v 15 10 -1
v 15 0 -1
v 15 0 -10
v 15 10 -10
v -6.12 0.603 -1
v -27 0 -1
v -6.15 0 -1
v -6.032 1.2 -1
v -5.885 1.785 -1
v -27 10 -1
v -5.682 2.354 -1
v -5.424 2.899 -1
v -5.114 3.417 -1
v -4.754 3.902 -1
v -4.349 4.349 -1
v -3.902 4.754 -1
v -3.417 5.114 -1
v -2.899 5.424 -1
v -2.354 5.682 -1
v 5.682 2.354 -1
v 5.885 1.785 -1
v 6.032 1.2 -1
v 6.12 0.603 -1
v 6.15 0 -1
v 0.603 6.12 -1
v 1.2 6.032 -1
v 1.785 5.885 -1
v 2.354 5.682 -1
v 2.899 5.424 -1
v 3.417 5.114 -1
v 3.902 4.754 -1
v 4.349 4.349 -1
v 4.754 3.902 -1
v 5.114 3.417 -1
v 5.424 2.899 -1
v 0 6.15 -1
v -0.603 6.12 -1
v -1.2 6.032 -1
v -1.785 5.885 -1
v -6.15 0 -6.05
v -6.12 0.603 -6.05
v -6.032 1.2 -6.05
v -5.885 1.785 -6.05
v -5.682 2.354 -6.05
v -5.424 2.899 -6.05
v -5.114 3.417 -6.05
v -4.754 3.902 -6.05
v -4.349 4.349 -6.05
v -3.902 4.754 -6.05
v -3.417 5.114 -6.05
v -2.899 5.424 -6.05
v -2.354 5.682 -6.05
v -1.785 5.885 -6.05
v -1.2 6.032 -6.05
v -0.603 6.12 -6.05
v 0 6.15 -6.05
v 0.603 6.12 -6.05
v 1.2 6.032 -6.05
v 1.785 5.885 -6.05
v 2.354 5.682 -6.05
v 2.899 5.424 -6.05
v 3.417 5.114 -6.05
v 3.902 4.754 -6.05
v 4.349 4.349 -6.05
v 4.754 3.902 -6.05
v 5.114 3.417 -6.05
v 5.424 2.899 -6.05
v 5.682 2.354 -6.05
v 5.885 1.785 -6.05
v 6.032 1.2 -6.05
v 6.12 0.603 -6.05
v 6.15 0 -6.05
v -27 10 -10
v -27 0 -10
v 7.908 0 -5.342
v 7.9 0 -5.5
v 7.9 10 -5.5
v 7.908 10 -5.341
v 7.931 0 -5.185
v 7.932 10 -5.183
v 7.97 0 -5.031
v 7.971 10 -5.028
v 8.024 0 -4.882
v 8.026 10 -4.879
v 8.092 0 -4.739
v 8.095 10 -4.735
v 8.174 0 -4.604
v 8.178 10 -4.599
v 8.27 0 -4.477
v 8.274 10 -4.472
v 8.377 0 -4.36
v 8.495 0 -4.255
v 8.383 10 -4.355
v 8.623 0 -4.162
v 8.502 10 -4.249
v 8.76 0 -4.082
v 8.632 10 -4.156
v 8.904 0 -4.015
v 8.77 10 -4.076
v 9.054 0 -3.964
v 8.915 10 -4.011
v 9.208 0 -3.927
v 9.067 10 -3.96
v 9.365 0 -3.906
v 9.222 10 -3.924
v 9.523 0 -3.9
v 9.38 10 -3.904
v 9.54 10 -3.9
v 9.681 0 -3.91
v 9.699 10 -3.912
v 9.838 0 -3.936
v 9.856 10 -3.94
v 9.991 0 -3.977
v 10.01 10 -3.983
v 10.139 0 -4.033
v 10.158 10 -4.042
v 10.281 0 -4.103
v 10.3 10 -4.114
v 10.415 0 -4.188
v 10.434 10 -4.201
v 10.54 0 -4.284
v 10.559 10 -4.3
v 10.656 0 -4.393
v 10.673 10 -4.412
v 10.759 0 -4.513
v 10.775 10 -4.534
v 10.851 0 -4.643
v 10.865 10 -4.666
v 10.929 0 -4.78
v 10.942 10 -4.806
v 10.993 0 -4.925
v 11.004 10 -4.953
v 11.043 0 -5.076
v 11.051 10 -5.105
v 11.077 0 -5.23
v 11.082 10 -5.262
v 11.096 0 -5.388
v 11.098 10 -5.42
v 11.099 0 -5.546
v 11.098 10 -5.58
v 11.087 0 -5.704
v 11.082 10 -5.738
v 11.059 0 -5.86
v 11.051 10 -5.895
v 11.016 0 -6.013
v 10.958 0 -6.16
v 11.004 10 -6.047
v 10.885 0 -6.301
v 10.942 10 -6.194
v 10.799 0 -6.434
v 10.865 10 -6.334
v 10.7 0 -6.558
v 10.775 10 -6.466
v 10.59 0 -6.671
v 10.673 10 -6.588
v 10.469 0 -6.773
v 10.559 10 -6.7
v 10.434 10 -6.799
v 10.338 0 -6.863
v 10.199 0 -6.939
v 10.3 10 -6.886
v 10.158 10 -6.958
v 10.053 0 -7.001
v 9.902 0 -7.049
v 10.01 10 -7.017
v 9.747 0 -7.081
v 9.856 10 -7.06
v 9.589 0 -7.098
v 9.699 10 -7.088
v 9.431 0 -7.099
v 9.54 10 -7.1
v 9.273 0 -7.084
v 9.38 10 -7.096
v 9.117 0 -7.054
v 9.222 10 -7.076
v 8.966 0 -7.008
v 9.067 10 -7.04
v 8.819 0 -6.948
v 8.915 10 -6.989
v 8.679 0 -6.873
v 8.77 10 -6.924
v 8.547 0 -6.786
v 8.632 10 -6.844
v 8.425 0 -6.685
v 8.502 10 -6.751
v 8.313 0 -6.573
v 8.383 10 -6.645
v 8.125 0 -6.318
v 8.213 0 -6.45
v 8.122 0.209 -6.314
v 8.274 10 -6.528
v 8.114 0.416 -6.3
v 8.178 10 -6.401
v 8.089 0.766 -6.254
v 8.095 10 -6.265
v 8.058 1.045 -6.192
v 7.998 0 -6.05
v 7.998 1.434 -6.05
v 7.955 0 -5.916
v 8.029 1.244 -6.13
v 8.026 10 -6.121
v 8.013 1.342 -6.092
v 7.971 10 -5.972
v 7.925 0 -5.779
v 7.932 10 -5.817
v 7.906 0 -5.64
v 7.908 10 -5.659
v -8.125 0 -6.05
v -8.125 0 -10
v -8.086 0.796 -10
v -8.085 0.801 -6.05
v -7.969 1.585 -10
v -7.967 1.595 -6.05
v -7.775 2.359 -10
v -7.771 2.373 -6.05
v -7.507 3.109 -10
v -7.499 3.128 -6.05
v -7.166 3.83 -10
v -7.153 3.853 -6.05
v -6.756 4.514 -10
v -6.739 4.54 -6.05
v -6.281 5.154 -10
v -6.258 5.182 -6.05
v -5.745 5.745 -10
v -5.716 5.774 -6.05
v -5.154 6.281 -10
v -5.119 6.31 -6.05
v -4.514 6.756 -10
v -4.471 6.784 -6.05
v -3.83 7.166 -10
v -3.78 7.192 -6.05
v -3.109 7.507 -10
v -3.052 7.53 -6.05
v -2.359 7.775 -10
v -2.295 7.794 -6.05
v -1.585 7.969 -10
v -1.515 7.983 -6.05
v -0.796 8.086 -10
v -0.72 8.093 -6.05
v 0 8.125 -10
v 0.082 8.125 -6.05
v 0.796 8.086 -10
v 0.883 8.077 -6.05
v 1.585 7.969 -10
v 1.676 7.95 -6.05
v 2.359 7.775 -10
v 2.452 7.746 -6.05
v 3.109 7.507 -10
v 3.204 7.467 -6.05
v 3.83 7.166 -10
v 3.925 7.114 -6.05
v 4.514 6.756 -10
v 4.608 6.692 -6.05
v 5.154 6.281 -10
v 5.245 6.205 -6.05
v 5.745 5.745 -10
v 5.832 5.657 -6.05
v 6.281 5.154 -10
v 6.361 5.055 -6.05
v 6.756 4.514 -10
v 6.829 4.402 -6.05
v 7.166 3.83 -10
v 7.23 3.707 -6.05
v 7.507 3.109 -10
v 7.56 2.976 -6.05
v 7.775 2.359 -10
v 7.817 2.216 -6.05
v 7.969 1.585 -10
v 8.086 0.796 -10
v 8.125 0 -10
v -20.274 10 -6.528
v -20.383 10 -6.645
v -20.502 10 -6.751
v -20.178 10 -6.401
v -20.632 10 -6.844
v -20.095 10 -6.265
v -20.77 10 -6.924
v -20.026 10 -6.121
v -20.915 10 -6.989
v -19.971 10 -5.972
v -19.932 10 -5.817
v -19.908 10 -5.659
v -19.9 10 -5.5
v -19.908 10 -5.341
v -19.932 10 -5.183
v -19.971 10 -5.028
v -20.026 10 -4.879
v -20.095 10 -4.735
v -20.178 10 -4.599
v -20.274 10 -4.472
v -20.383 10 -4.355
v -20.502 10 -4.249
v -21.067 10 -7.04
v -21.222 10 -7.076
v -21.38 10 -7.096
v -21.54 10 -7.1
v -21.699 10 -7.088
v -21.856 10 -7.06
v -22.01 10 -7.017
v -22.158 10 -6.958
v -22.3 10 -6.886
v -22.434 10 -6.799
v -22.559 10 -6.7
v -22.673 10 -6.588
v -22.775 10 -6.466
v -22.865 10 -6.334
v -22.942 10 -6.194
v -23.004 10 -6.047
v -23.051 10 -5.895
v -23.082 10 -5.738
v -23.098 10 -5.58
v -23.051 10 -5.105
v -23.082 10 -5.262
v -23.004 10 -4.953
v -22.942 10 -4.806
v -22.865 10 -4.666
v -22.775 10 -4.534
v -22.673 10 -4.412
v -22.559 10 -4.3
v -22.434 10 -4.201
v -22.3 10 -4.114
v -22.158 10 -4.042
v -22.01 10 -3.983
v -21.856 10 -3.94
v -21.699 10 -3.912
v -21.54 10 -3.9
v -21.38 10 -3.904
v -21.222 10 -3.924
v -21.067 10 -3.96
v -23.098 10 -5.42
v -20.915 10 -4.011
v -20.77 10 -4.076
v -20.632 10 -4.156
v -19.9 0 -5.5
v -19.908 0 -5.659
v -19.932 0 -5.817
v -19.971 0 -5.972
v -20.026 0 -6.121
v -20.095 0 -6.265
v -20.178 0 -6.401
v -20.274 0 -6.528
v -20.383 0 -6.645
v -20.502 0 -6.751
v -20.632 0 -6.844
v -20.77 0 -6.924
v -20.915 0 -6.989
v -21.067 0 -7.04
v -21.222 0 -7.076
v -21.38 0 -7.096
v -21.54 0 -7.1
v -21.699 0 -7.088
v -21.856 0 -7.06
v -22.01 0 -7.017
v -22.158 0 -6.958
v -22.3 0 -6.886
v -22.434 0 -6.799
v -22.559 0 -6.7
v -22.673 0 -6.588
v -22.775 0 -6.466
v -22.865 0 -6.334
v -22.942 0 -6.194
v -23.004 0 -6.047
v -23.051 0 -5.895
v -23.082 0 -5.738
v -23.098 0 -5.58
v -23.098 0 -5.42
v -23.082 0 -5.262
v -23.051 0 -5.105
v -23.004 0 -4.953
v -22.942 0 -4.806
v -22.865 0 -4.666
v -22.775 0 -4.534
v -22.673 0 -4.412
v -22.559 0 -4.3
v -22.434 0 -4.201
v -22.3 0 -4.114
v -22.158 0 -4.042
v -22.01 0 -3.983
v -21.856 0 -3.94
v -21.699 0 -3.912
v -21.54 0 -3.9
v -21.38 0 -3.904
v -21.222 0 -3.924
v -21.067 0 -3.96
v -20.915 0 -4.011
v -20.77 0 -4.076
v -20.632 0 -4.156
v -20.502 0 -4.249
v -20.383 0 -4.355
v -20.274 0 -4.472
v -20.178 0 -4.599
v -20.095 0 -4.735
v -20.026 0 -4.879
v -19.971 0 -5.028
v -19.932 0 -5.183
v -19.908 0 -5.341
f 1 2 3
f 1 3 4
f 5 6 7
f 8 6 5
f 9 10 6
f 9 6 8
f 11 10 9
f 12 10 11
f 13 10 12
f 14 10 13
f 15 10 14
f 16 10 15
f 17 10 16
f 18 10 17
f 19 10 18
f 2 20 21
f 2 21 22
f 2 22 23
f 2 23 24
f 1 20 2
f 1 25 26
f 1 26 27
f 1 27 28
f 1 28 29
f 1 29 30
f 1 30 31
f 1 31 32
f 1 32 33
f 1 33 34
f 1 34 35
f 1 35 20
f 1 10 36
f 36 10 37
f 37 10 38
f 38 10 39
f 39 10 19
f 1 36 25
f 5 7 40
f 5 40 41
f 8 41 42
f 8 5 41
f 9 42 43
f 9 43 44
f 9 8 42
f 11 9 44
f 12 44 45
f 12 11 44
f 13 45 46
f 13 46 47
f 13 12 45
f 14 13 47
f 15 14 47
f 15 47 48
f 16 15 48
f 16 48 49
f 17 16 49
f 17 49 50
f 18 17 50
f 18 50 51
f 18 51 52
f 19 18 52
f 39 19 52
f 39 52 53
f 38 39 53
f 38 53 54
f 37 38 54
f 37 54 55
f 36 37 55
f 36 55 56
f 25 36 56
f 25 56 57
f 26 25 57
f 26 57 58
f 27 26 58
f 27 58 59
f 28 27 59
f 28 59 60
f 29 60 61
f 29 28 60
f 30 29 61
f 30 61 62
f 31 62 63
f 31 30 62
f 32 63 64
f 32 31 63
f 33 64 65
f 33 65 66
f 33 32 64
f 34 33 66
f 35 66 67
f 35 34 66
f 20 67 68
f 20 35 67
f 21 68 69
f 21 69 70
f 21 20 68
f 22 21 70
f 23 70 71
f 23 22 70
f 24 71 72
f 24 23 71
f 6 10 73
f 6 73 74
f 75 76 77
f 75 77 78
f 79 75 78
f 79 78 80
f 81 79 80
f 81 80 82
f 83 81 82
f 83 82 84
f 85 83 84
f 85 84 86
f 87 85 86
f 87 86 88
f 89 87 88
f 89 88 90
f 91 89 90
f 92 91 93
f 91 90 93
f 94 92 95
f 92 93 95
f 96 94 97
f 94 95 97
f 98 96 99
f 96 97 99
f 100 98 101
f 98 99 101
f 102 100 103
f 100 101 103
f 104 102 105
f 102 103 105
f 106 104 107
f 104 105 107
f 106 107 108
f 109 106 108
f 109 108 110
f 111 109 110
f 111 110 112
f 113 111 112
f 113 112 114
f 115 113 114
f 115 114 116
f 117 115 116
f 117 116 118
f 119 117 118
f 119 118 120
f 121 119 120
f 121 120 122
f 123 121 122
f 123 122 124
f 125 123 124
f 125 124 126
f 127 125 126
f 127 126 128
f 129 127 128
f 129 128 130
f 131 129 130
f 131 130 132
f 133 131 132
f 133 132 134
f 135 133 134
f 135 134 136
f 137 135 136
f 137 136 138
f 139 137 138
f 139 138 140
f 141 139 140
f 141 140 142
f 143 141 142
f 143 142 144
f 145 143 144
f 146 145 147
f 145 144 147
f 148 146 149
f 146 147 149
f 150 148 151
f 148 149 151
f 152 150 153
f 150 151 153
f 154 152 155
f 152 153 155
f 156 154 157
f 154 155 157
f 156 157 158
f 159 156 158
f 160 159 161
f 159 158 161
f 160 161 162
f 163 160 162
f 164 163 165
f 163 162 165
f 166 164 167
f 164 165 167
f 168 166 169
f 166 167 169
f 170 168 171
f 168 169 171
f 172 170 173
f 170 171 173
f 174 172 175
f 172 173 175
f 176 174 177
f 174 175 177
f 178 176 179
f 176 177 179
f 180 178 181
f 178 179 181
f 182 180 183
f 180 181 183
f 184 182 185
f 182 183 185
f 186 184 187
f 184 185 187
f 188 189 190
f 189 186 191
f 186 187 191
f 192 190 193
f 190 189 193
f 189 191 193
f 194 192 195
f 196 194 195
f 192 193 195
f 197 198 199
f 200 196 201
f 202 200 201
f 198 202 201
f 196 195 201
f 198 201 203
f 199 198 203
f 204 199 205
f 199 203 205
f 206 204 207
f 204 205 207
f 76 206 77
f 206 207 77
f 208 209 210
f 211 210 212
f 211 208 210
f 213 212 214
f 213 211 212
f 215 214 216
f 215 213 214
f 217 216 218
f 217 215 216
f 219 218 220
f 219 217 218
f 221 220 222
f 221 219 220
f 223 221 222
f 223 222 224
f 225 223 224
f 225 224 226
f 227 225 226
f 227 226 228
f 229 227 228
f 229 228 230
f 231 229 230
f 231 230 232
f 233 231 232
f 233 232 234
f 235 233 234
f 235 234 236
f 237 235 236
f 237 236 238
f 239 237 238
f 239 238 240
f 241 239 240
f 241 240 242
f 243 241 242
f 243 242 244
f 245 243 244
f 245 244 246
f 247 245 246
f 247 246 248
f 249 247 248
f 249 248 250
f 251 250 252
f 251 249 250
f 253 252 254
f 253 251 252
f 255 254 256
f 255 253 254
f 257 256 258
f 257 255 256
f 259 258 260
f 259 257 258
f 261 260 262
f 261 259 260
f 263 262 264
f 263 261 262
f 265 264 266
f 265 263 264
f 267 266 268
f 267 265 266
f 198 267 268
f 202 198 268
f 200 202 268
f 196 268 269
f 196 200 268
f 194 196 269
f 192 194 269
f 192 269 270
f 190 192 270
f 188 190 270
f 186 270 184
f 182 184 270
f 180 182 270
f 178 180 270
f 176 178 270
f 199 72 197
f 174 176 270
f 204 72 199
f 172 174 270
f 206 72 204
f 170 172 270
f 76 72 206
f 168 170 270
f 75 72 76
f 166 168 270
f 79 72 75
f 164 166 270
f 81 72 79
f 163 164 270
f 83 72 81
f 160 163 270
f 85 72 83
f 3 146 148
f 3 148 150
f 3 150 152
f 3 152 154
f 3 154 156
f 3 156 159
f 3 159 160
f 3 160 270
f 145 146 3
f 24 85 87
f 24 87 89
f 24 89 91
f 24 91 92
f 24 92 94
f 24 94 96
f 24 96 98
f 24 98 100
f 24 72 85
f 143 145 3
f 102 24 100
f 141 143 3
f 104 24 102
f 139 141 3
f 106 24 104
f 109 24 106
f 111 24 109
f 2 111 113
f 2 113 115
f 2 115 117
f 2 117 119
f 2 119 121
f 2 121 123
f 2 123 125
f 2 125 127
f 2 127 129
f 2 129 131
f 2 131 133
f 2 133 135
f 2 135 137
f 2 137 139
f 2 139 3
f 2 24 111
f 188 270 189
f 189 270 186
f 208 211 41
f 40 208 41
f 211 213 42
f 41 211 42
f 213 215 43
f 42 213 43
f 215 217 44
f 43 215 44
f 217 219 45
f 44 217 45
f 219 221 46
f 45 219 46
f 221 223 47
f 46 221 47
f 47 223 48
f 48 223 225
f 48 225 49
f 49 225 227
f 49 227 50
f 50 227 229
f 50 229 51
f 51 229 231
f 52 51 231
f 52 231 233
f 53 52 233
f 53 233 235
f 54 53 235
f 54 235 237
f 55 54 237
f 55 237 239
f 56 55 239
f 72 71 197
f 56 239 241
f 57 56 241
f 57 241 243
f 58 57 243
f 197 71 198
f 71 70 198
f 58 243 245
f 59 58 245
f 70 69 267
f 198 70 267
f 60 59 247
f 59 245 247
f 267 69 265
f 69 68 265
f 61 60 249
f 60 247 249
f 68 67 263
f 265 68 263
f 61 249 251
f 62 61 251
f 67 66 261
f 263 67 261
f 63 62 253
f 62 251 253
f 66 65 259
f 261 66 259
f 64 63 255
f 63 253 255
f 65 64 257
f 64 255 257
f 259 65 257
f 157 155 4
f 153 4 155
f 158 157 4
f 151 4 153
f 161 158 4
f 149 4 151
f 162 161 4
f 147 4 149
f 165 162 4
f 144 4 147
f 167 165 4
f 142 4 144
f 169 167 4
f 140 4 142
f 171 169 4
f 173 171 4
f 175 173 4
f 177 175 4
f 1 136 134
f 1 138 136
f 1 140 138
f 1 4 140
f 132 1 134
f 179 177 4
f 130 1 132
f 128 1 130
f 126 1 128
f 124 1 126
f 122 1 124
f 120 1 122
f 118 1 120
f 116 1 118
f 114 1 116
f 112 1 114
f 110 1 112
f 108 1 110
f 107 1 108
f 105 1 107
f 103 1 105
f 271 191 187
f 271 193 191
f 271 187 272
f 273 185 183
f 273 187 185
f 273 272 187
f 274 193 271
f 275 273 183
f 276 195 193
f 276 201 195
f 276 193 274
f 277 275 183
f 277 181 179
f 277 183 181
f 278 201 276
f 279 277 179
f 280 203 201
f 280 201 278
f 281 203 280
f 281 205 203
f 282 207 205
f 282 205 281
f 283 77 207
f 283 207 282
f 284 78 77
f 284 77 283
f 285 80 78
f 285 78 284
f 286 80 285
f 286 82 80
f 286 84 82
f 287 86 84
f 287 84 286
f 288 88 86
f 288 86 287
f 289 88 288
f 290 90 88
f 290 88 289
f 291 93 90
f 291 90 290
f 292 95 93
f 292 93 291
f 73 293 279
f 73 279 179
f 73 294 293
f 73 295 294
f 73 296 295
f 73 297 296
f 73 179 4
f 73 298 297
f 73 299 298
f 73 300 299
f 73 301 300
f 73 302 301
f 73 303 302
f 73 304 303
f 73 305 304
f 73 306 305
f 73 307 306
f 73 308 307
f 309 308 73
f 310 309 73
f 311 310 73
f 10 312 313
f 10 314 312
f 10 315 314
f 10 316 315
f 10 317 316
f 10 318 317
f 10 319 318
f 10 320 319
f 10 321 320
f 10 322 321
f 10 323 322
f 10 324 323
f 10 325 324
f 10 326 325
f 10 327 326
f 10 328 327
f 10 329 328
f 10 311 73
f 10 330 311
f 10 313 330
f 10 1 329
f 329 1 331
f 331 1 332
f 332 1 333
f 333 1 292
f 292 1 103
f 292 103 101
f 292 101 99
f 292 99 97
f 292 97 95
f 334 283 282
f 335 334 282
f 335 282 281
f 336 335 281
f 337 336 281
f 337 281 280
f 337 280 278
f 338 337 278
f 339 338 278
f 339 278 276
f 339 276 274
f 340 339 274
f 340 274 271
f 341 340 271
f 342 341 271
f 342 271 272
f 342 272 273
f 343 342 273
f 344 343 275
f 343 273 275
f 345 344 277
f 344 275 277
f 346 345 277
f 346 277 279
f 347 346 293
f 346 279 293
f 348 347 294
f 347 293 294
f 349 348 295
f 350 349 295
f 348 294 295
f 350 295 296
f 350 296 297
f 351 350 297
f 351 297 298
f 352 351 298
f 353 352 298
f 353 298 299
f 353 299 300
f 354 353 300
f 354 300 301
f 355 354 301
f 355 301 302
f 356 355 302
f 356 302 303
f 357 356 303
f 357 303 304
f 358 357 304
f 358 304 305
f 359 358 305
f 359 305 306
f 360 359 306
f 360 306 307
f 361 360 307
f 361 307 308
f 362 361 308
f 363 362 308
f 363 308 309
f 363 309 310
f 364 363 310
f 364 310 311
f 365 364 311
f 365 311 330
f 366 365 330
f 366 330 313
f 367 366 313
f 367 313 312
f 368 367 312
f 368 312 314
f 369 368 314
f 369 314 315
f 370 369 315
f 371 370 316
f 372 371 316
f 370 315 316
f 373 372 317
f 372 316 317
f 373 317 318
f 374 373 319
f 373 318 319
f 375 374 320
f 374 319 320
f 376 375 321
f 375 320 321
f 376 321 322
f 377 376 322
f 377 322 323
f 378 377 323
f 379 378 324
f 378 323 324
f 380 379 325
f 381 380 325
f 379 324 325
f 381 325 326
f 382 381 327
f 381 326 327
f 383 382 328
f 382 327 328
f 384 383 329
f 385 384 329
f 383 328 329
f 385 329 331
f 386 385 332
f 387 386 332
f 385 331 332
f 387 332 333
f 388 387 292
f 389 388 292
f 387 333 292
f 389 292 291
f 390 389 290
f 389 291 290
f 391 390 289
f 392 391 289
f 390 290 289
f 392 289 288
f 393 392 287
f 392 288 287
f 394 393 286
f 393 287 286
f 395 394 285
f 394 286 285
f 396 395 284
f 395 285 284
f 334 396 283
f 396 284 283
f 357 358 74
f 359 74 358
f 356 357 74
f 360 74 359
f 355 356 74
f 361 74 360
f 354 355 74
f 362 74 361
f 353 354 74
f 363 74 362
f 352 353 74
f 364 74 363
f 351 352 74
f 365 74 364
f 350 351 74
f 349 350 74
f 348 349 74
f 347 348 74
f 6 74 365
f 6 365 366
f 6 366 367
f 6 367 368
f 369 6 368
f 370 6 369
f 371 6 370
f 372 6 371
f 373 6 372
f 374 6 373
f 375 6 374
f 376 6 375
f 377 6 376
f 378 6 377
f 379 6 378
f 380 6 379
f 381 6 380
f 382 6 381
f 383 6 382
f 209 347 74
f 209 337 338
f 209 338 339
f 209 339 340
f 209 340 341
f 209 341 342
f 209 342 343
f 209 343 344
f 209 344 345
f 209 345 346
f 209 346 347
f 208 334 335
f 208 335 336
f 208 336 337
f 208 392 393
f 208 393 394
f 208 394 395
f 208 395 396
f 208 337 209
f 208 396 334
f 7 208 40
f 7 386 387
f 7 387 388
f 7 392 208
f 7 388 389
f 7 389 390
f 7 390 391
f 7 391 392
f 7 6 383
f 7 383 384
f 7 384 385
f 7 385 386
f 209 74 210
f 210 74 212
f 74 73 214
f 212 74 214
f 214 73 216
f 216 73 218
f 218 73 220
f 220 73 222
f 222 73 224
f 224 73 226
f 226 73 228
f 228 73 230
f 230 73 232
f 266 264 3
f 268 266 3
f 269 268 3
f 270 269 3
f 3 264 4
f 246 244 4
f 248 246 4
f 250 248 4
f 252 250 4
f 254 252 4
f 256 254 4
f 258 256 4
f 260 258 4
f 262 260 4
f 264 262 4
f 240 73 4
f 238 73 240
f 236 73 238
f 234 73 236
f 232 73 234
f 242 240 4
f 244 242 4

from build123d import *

# Parameters (mm, degrees)
F1_DEPTH = 10
F2_DEPTH = 6.3
F3_R     = 1.6
F4_DEPTH = 25
F5_DEPTH = 1
F6_DEPTH = 0.25


with BuildPart() as f1:
    # F0 (on Top) → F1 (new body)
    with BuildSketch(Plane.XY):
        with BuildLine():
            ThreePointArc((-8.125, 0), (0, 8.125), (8.125, 0))
            Line((8.125, 0), (15, 0))
            Line((15, 0), (15, 10))
            Line((15, 10), (-27, 10))
            Line((-27, 10), (-27, 0))
            Line((-27, 0), (-8.125, 0))
        make_face()
    extrude(amount=-F1_DEPTH)

    # F0 (on Top) → F2 (join)
    with BuildSketch(Plane.XY):
        with BuildLine():
            ThreePointArc((-6.15, 0), (0, 6.15), (6.15, 0))
            Line((6.15, 0), (8.125, 0))
            ThreePointArc((8.125, 0), (0, 8.125), (-8.125, 0))
            Line((-8.125, 0), (-6.15, 0))
        make_face()
    extrude(amount=-F2_DEPTH)

    # F3 (on face) → F4 (cut)
    with BuildSketch(Plane(origin=(0, 10, 0), x_dir=(-1, 0, 0), z_dir=(0, 1, 0))):
        with Locations((-9.5, -5.5)):
            Circle(F3_R)
        with BuildLine():
            ThreePointArc((23.1, -5.5), (21.5, -3.9), (19.9, -5.5))
            ThreePointArc((19.9, -5.5), (21.5, -7.1), (23.1, -5.5))
        make_face()
    extrude(amount=-F4_DEPTH, mode=Mode.SUBTRACT)

    # F0 (on Top) → F5 (cut)
    with BuildSketch(Plane.XY):
        with BuildLine():
            ThreePointArc((-8.125, 0), (0, 8.125), (8.125, 0))
            Line((8.125, 0), (15, 0))
            Line((15, 0), (15, 10))
            Line((15, 10), (-27, 10))
            Line((-27, 10), (-27, 0))
            Line((-27, 0), (-8.125, 0))
        make_face()
        with BuildLine():
            ThreePointArc((-6.15, 0), (0, 6.15), (6.15, 0))
            Line((6.15, 0), (8.125, 0))
            ThreePointArc((8.125, 0), (0, 8.125), (-8.125, 0))
            Line((-8.125, 0), (-6.15, 0))
        make_face()
    extrude(amount=-F5_DEPTH, mode=Mode.SUBTRACT)

    # F6 (cut): a face of the model
    f6_faces = [f1.faces().sort_by_distance(p)[0] for p in [
        (-7.1375, 0.1815853566, -6.3),
    ]]
    extrude(f6_faces, amount=-F6_DEPTH, mode=Mode.SUBTRACT)


solid = f1.part
